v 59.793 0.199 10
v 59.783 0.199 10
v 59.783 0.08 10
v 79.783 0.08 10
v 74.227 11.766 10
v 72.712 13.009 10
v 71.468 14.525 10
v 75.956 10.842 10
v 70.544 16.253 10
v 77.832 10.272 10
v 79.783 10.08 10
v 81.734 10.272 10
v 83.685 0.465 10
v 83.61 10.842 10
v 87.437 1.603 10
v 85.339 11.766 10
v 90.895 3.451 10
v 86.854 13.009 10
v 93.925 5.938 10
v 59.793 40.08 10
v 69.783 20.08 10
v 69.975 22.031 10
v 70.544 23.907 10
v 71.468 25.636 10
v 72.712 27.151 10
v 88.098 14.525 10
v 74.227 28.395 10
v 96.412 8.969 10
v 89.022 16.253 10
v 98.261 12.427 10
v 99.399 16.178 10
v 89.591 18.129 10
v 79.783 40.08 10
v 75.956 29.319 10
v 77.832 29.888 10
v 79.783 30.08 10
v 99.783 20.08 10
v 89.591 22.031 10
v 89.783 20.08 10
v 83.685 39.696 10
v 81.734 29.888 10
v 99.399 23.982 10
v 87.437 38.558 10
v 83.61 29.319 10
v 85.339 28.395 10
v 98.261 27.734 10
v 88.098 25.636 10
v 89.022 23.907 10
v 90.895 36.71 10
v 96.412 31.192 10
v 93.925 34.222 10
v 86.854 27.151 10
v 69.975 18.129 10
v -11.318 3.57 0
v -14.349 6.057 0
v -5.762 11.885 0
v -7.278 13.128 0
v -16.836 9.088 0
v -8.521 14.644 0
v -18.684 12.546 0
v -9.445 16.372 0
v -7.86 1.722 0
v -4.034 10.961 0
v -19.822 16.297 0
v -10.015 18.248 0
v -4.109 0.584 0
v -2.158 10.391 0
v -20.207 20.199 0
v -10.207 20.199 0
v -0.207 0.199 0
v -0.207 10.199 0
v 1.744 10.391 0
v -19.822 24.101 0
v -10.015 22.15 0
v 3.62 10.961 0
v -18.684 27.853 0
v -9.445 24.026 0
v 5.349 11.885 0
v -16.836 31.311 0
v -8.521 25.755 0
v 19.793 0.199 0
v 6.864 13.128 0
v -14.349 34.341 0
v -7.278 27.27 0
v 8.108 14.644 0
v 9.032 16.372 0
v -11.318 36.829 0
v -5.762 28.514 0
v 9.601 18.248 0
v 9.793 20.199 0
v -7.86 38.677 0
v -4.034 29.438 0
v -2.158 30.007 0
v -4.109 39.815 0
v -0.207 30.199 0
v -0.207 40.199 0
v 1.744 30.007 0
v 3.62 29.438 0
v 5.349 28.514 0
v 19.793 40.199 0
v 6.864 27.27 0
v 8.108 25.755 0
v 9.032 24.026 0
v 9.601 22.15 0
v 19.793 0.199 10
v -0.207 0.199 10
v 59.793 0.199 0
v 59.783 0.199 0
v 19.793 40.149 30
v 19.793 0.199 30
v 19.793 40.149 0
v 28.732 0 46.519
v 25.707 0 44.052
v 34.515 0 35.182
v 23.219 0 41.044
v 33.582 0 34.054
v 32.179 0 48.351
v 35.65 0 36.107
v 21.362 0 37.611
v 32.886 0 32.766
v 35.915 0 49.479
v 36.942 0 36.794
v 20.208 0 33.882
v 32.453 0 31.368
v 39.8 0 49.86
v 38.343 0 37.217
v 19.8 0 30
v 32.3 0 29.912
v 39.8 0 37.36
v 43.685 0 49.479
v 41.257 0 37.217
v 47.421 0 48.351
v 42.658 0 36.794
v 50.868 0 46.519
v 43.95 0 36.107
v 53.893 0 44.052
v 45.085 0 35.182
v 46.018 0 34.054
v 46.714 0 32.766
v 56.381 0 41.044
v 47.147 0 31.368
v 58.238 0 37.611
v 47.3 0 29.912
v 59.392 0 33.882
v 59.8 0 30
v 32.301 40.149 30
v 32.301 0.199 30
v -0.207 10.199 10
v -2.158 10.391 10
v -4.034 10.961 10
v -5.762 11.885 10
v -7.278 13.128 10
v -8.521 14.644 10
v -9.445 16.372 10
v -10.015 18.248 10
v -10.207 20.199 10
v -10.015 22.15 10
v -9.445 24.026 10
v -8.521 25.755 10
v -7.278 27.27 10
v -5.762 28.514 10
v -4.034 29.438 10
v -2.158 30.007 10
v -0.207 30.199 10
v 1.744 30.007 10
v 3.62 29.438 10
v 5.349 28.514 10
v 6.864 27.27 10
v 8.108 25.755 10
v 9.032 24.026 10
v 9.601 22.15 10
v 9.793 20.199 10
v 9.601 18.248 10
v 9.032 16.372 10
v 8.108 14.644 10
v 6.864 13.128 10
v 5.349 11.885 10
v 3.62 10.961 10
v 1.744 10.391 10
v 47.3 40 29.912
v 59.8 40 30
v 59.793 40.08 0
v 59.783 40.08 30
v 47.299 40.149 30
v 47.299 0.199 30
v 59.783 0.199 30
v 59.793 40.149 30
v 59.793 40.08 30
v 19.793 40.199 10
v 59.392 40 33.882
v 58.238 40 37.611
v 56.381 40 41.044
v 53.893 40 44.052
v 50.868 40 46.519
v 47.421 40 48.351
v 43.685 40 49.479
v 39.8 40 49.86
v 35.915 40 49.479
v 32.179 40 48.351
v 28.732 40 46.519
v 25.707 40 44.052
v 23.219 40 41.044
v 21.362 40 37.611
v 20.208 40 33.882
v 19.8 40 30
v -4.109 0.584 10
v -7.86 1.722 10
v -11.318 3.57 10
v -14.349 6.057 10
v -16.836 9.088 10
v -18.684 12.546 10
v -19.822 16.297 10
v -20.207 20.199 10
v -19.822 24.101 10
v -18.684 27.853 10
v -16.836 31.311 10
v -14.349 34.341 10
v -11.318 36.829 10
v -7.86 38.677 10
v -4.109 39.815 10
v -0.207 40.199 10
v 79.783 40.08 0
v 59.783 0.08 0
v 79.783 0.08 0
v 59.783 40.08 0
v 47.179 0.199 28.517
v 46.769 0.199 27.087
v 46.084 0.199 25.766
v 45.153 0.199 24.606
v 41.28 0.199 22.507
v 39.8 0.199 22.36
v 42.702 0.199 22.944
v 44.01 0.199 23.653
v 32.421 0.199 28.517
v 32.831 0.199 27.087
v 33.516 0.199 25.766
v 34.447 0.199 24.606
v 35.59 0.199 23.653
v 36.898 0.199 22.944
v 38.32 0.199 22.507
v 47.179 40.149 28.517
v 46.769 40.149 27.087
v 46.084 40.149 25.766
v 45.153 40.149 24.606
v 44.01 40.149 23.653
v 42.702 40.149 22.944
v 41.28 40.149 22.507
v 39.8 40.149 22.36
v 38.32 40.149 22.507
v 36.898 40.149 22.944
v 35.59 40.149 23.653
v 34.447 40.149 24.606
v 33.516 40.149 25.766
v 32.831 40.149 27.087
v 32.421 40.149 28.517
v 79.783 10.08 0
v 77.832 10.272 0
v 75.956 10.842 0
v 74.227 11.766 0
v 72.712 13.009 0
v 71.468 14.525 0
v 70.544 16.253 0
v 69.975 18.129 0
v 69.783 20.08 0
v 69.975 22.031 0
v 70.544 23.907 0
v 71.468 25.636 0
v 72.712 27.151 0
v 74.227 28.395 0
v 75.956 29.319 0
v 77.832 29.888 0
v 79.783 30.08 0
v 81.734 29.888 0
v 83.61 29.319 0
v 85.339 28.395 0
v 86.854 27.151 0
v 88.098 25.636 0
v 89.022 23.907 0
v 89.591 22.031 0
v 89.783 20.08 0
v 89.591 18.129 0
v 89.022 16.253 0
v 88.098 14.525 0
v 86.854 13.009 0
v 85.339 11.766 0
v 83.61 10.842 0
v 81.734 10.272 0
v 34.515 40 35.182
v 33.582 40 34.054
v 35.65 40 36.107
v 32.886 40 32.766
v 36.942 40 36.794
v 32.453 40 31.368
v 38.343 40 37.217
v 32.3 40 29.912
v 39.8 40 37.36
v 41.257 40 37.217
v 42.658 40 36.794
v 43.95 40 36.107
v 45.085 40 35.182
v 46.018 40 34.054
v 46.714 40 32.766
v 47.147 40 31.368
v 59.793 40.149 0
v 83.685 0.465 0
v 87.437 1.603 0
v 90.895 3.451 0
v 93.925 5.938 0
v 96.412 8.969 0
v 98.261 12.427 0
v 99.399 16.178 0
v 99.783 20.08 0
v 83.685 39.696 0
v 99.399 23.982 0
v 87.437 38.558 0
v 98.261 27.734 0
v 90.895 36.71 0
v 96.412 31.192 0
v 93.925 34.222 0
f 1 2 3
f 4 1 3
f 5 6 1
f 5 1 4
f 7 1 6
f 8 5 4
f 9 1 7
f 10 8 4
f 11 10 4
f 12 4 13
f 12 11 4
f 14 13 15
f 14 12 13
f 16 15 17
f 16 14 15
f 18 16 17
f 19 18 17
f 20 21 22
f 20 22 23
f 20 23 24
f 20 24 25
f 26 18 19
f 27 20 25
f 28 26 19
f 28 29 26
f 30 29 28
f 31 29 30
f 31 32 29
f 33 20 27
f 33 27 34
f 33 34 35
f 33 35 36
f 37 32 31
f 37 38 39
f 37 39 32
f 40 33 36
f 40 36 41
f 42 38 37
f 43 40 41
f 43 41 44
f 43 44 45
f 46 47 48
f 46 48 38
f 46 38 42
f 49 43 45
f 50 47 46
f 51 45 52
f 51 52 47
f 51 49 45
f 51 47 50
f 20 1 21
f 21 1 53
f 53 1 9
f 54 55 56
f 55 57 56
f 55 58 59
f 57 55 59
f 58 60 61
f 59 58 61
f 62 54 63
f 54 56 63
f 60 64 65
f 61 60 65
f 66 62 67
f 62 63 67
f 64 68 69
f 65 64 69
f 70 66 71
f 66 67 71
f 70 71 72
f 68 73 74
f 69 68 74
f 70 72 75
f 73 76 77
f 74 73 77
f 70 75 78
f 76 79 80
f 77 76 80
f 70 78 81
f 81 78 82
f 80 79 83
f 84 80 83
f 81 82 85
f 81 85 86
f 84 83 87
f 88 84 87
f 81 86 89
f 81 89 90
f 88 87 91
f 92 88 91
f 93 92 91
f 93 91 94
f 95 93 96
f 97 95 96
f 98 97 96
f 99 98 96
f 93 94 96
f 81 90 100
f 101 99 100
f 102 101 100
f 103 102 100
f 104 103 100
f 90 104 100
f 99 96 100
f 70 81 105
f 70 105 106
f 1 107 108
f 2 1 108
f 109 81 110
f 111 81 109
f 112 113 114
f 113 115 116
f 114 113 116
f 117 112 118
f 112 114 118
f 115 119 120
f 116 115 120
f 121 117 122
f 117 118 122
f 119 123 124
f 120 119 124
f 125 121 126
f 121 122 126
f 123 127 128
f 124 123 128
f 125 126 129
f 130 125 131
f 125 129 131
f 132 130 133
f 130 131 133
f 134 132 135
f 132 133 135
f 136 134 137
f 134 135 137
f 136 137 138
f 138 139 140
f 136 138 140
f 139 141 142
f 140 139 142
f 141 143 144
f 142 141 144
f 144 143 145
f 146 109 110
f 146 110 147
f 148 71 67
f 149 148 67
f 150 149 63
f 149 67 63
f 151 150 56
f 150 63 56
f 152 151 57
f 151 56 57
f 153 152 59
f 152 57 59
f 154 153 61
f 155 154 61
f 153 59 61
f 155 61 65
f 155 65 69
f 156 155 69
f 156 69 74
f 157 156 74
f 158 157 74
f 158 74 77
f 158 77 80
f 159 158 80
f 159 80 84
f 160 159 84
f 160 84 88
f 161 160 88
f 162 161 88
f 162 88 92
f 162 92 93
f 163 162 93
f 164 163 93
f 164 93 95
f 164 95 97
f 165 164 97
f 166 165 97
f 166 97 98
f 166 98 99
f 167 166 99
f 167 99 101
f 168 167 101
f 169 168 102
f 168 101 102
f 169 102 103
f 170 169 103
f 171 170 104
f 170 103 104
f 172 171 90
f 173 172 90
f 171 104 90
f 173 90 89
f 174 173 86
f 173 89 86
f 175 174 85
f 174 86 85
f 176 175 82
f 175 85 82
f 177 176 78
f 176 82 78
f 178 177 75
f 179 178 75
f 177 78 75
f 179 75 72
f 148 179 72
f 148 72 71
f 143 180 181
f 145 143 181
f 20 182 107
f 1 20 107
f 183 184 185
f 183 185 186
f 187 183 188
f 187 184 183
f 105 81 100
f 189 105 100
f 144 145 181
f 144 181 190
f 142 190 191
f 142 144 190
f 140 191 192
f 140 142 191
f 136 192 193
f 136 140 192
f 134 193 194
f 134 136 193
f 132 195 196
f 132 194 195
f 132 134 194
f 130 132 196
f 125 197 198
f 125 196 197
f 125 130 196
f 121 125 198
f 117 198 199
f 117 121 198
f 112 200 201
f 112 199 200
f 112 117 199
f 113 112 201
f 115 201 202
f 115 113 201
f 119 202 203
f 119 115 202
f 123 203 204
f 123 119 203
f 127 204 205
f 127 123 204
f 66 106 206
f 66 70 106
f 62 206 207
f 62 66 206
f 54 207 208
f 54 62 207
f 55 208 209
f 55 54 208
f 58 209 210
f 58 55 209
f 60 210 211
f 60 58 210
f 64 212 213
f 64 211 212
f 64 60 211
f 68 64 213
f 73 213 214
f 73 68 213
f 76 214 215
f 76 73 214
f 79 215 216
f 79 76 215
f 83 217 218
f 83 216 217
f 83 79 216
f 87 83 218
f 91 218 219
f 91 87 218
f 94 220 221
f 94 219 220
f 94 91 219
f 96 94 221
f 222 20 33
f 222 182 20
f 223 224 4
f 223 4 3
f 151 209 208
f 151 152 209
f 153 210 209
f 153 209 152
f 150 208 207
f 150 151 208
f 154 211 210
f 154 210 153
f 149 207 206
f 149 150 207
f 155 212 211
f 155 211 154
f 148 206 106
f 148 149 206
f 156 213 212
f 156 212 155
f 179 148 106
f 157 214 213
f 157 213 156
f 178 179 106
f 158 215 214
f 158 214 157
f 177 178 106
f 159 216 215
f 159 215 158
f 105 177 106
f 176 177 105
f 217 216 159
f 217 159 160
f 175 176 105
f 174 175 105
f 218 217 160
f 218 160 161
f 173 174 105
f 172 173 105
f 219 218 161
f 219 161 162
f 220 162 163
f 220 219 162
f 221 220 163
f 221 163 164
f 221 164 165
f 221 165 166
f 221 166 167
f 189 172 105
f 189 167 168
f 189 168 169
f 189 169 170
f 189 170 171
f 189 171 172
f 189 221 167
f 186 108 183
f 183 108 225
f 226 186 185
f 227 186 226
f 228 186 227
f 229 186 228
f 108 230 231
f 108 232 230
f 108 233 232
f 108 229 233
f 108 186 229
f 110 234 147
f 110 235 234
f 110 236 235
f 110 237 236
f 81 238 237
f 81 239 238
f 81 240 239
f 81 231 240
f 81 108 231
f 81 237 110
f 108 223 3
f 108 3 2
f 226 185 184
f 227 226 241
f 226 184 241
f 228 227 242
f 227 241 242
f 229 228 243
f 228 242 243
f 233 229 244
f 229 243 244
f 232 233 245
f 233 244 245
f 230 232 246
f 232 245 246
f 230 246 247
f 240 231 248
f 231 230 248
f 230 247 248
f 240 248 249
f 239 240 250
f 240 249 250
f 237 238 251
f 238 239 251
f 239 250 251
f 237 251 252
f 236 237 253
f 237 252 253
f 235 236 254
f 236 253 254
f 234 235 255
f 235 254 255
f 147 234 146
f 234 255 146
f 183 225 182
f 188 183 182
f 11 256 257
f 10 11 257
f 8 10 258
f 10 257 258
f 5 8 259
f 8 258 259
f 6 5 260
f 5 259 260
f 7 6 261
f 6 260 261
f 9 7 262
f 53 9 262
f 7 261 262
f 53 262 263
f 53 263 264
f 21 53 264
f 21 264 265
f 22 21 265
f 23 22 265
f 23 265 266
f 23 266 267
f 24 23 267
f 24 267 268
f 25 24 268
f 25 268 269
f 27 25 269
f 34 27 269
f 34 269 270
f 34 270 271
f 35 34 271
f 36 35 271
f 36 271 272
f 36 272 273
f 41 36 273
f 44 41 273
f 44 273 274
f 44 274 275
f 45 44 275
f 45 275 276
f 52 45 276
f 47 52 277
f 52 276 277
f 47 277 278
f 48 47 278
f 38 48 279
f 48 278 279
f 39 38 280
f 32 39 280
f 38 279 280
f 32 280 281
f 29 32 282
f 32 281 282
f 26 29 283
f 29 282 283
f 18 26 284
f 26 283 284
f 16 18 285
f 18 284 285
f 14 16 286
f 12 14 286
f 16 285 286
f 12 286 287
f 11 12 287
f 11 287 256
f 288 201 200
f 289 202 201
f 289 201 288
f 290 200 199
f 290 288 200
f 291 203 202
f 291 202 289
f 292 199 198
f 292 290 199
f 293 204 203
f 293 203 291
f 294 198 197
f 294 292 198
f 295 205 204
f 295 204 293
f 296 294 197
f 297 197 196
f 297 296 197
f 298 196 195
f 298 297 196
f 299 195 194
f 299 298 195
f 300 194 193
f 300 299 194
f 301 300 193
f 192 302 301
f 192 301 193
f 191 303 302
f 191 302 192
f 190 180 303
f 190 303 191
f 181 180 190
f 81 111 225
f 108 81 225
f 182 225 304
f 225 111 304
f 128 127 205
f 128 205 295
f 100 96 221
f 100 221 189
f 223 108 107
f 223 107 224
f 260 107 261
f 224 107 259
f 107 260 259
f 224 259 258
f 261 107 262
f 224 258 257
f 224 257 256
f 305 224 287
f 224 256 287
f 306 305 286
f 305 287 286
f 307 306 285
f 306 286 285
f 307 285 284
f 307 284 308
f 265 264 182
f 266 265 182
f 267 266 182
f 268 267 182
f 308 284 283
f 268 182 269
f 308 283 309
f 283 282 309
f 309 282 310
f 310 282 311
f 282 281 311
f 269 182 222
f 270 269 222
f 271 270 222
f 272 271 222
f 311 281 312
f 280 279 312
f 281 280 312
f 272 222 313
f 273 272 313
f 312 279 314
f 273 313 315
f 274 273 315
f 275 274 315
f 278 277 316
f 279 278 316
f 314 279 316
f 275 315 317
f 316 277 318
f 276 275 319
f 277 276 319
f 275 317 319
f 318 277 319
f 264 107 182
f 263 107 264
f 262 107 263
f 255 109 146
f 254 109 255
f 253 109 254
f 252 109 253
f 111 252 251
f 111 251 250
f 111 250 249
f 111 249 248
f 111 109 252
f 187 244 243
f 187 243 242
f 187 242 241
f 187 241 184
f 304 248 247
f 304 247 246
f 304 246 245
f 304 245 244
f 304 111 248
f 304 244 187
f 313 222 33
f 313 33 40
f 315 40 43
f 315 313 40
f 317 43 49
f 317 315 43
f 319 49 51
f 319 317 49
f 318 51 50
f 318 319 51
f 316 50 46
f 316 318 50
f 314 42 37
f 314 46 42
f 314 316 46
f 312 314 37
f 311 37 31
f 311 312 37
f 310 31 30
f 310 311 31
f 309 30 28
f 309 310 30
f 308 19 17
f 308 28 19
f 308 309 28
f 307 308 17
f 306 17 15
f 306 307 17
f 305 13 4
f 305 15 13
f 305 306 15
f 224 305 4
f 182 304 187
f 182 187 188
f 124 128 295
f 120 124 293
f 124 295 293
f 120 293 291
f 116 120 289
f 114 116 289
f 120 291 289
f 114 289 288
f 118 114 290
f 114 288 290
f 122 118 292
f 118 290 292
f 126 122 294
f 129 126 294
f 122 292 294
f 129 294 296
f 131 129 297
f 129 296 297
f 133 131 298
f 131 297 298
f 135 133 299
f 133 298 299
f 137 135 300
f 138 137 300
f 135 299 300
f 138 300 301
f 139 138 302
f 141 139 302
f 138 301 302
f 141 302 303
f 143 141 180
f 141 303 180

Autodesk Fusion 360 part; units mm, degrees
sketch "Sketch1" plane through (0, 0, 0) normal (0, 0, 1) x (1, 0, 0)
  line L0 (19.7933, 40.1491) -> (59.7933, 40.1491)
  line L1 (59.7933, 40.1491) -> (59.7933, 0.1992)
  line L2 (59.7933, 0.1992) -> (19.7933, 0.1992)
  line L3 (19.7933, 0.1992) -> (19.7933, 40.1491)
  line L4 (-0.2067, 40.1993) -> (19.7933, 40.1993)
  line L5 (19.7933, 40.1993) -> (19.7933, 0.1993)
  line L6 (19.7933, 0.1993) -> (-0.2067, 0.1993)
  line L7 (-0.2067, 0.1993) -> (-0.2067, 40.1993)
  line L8 (59.7831, 40.0803) -> (79.7831, 40.0803)
  line L9 (79.7831, 40.0803) -> (79.7831, 0.0803)
  line L10 (79.7831, 0.0803) -> (59.7831, 0.0803)
  line L11 (59.7831, 0.0803) -> (59.7831, 40.0803)
  arc A0 (-0.2067, 40.1993) -> (-0.2067, 0.1993) centre (-0.2067, 20.1993) ccw
  arc A1 (59.7933, 20.7212) -> (59.7933, 19.4394) centre (79.7831, 20.0803) ccw
  arc A2 (79.7831, 0.0803) -> (79.7831, 40.0803) centre (79.7831, 20.0803) ccw
  dimension "d1" = 40
  dimension "d3" = 20
  dimension "d4" = 40
  dimension "d13" = 40
  dimension "d14" = 40
extrude "Extrude1" add sketch "Sketch1" along normal blind 10 contours L3 L4 L5 L6 L7 makes body 1
extrude "Extrude2" add sketch "Sketch1" along normal blind 30 separate body contours L0 L1 L2 L3 L5 L8 L11 makes body 2
extrude "Extrude3" add sketch "Sketch1" along normal blind 10 separate body contours L1 L2 L8 L9 L10 L11 makes body 3
extrude "Extrude4" add sketch "Sketch1" along normal blind 10 contours L7 A0 bodies 1
extrude "Extrude5" add sketch "Sketch1" along normal blind 10 contours L9 A2 bodies 3
hole "Hole1" at (-0.2067, 20.1993, 10) direction (0, 0, -1) diameter 20 depth 20 tip angle 180 bodies 1
hole "Hole2" at (79.7831, 20.0803, 10) direction (0, 0, -1) diameter 20 depth 20 tip angle 180 bodies 3
sketch "Sketch3" plane through (0, 0, 0) normal (0, 1, 0) x (1, 0, 0)
  arc A0 (19.8, -30) -> (59.8, -30) centre (39.8, -29.8598) ccw
  line L0 (19.8, -30) -> (39.8, -29.8598)
  line L1 (39.8, -29.8598) -> (59.8, -30)
extrude "Extrude6" add sketch "Sketch3" along normal blind 40 separate body makes body 4
hole "Hole3" at (39.8, 0, 29.8598) direction (0, 1, 0) diameter 15 depth 50 tip angle 180 bodies 2 4
